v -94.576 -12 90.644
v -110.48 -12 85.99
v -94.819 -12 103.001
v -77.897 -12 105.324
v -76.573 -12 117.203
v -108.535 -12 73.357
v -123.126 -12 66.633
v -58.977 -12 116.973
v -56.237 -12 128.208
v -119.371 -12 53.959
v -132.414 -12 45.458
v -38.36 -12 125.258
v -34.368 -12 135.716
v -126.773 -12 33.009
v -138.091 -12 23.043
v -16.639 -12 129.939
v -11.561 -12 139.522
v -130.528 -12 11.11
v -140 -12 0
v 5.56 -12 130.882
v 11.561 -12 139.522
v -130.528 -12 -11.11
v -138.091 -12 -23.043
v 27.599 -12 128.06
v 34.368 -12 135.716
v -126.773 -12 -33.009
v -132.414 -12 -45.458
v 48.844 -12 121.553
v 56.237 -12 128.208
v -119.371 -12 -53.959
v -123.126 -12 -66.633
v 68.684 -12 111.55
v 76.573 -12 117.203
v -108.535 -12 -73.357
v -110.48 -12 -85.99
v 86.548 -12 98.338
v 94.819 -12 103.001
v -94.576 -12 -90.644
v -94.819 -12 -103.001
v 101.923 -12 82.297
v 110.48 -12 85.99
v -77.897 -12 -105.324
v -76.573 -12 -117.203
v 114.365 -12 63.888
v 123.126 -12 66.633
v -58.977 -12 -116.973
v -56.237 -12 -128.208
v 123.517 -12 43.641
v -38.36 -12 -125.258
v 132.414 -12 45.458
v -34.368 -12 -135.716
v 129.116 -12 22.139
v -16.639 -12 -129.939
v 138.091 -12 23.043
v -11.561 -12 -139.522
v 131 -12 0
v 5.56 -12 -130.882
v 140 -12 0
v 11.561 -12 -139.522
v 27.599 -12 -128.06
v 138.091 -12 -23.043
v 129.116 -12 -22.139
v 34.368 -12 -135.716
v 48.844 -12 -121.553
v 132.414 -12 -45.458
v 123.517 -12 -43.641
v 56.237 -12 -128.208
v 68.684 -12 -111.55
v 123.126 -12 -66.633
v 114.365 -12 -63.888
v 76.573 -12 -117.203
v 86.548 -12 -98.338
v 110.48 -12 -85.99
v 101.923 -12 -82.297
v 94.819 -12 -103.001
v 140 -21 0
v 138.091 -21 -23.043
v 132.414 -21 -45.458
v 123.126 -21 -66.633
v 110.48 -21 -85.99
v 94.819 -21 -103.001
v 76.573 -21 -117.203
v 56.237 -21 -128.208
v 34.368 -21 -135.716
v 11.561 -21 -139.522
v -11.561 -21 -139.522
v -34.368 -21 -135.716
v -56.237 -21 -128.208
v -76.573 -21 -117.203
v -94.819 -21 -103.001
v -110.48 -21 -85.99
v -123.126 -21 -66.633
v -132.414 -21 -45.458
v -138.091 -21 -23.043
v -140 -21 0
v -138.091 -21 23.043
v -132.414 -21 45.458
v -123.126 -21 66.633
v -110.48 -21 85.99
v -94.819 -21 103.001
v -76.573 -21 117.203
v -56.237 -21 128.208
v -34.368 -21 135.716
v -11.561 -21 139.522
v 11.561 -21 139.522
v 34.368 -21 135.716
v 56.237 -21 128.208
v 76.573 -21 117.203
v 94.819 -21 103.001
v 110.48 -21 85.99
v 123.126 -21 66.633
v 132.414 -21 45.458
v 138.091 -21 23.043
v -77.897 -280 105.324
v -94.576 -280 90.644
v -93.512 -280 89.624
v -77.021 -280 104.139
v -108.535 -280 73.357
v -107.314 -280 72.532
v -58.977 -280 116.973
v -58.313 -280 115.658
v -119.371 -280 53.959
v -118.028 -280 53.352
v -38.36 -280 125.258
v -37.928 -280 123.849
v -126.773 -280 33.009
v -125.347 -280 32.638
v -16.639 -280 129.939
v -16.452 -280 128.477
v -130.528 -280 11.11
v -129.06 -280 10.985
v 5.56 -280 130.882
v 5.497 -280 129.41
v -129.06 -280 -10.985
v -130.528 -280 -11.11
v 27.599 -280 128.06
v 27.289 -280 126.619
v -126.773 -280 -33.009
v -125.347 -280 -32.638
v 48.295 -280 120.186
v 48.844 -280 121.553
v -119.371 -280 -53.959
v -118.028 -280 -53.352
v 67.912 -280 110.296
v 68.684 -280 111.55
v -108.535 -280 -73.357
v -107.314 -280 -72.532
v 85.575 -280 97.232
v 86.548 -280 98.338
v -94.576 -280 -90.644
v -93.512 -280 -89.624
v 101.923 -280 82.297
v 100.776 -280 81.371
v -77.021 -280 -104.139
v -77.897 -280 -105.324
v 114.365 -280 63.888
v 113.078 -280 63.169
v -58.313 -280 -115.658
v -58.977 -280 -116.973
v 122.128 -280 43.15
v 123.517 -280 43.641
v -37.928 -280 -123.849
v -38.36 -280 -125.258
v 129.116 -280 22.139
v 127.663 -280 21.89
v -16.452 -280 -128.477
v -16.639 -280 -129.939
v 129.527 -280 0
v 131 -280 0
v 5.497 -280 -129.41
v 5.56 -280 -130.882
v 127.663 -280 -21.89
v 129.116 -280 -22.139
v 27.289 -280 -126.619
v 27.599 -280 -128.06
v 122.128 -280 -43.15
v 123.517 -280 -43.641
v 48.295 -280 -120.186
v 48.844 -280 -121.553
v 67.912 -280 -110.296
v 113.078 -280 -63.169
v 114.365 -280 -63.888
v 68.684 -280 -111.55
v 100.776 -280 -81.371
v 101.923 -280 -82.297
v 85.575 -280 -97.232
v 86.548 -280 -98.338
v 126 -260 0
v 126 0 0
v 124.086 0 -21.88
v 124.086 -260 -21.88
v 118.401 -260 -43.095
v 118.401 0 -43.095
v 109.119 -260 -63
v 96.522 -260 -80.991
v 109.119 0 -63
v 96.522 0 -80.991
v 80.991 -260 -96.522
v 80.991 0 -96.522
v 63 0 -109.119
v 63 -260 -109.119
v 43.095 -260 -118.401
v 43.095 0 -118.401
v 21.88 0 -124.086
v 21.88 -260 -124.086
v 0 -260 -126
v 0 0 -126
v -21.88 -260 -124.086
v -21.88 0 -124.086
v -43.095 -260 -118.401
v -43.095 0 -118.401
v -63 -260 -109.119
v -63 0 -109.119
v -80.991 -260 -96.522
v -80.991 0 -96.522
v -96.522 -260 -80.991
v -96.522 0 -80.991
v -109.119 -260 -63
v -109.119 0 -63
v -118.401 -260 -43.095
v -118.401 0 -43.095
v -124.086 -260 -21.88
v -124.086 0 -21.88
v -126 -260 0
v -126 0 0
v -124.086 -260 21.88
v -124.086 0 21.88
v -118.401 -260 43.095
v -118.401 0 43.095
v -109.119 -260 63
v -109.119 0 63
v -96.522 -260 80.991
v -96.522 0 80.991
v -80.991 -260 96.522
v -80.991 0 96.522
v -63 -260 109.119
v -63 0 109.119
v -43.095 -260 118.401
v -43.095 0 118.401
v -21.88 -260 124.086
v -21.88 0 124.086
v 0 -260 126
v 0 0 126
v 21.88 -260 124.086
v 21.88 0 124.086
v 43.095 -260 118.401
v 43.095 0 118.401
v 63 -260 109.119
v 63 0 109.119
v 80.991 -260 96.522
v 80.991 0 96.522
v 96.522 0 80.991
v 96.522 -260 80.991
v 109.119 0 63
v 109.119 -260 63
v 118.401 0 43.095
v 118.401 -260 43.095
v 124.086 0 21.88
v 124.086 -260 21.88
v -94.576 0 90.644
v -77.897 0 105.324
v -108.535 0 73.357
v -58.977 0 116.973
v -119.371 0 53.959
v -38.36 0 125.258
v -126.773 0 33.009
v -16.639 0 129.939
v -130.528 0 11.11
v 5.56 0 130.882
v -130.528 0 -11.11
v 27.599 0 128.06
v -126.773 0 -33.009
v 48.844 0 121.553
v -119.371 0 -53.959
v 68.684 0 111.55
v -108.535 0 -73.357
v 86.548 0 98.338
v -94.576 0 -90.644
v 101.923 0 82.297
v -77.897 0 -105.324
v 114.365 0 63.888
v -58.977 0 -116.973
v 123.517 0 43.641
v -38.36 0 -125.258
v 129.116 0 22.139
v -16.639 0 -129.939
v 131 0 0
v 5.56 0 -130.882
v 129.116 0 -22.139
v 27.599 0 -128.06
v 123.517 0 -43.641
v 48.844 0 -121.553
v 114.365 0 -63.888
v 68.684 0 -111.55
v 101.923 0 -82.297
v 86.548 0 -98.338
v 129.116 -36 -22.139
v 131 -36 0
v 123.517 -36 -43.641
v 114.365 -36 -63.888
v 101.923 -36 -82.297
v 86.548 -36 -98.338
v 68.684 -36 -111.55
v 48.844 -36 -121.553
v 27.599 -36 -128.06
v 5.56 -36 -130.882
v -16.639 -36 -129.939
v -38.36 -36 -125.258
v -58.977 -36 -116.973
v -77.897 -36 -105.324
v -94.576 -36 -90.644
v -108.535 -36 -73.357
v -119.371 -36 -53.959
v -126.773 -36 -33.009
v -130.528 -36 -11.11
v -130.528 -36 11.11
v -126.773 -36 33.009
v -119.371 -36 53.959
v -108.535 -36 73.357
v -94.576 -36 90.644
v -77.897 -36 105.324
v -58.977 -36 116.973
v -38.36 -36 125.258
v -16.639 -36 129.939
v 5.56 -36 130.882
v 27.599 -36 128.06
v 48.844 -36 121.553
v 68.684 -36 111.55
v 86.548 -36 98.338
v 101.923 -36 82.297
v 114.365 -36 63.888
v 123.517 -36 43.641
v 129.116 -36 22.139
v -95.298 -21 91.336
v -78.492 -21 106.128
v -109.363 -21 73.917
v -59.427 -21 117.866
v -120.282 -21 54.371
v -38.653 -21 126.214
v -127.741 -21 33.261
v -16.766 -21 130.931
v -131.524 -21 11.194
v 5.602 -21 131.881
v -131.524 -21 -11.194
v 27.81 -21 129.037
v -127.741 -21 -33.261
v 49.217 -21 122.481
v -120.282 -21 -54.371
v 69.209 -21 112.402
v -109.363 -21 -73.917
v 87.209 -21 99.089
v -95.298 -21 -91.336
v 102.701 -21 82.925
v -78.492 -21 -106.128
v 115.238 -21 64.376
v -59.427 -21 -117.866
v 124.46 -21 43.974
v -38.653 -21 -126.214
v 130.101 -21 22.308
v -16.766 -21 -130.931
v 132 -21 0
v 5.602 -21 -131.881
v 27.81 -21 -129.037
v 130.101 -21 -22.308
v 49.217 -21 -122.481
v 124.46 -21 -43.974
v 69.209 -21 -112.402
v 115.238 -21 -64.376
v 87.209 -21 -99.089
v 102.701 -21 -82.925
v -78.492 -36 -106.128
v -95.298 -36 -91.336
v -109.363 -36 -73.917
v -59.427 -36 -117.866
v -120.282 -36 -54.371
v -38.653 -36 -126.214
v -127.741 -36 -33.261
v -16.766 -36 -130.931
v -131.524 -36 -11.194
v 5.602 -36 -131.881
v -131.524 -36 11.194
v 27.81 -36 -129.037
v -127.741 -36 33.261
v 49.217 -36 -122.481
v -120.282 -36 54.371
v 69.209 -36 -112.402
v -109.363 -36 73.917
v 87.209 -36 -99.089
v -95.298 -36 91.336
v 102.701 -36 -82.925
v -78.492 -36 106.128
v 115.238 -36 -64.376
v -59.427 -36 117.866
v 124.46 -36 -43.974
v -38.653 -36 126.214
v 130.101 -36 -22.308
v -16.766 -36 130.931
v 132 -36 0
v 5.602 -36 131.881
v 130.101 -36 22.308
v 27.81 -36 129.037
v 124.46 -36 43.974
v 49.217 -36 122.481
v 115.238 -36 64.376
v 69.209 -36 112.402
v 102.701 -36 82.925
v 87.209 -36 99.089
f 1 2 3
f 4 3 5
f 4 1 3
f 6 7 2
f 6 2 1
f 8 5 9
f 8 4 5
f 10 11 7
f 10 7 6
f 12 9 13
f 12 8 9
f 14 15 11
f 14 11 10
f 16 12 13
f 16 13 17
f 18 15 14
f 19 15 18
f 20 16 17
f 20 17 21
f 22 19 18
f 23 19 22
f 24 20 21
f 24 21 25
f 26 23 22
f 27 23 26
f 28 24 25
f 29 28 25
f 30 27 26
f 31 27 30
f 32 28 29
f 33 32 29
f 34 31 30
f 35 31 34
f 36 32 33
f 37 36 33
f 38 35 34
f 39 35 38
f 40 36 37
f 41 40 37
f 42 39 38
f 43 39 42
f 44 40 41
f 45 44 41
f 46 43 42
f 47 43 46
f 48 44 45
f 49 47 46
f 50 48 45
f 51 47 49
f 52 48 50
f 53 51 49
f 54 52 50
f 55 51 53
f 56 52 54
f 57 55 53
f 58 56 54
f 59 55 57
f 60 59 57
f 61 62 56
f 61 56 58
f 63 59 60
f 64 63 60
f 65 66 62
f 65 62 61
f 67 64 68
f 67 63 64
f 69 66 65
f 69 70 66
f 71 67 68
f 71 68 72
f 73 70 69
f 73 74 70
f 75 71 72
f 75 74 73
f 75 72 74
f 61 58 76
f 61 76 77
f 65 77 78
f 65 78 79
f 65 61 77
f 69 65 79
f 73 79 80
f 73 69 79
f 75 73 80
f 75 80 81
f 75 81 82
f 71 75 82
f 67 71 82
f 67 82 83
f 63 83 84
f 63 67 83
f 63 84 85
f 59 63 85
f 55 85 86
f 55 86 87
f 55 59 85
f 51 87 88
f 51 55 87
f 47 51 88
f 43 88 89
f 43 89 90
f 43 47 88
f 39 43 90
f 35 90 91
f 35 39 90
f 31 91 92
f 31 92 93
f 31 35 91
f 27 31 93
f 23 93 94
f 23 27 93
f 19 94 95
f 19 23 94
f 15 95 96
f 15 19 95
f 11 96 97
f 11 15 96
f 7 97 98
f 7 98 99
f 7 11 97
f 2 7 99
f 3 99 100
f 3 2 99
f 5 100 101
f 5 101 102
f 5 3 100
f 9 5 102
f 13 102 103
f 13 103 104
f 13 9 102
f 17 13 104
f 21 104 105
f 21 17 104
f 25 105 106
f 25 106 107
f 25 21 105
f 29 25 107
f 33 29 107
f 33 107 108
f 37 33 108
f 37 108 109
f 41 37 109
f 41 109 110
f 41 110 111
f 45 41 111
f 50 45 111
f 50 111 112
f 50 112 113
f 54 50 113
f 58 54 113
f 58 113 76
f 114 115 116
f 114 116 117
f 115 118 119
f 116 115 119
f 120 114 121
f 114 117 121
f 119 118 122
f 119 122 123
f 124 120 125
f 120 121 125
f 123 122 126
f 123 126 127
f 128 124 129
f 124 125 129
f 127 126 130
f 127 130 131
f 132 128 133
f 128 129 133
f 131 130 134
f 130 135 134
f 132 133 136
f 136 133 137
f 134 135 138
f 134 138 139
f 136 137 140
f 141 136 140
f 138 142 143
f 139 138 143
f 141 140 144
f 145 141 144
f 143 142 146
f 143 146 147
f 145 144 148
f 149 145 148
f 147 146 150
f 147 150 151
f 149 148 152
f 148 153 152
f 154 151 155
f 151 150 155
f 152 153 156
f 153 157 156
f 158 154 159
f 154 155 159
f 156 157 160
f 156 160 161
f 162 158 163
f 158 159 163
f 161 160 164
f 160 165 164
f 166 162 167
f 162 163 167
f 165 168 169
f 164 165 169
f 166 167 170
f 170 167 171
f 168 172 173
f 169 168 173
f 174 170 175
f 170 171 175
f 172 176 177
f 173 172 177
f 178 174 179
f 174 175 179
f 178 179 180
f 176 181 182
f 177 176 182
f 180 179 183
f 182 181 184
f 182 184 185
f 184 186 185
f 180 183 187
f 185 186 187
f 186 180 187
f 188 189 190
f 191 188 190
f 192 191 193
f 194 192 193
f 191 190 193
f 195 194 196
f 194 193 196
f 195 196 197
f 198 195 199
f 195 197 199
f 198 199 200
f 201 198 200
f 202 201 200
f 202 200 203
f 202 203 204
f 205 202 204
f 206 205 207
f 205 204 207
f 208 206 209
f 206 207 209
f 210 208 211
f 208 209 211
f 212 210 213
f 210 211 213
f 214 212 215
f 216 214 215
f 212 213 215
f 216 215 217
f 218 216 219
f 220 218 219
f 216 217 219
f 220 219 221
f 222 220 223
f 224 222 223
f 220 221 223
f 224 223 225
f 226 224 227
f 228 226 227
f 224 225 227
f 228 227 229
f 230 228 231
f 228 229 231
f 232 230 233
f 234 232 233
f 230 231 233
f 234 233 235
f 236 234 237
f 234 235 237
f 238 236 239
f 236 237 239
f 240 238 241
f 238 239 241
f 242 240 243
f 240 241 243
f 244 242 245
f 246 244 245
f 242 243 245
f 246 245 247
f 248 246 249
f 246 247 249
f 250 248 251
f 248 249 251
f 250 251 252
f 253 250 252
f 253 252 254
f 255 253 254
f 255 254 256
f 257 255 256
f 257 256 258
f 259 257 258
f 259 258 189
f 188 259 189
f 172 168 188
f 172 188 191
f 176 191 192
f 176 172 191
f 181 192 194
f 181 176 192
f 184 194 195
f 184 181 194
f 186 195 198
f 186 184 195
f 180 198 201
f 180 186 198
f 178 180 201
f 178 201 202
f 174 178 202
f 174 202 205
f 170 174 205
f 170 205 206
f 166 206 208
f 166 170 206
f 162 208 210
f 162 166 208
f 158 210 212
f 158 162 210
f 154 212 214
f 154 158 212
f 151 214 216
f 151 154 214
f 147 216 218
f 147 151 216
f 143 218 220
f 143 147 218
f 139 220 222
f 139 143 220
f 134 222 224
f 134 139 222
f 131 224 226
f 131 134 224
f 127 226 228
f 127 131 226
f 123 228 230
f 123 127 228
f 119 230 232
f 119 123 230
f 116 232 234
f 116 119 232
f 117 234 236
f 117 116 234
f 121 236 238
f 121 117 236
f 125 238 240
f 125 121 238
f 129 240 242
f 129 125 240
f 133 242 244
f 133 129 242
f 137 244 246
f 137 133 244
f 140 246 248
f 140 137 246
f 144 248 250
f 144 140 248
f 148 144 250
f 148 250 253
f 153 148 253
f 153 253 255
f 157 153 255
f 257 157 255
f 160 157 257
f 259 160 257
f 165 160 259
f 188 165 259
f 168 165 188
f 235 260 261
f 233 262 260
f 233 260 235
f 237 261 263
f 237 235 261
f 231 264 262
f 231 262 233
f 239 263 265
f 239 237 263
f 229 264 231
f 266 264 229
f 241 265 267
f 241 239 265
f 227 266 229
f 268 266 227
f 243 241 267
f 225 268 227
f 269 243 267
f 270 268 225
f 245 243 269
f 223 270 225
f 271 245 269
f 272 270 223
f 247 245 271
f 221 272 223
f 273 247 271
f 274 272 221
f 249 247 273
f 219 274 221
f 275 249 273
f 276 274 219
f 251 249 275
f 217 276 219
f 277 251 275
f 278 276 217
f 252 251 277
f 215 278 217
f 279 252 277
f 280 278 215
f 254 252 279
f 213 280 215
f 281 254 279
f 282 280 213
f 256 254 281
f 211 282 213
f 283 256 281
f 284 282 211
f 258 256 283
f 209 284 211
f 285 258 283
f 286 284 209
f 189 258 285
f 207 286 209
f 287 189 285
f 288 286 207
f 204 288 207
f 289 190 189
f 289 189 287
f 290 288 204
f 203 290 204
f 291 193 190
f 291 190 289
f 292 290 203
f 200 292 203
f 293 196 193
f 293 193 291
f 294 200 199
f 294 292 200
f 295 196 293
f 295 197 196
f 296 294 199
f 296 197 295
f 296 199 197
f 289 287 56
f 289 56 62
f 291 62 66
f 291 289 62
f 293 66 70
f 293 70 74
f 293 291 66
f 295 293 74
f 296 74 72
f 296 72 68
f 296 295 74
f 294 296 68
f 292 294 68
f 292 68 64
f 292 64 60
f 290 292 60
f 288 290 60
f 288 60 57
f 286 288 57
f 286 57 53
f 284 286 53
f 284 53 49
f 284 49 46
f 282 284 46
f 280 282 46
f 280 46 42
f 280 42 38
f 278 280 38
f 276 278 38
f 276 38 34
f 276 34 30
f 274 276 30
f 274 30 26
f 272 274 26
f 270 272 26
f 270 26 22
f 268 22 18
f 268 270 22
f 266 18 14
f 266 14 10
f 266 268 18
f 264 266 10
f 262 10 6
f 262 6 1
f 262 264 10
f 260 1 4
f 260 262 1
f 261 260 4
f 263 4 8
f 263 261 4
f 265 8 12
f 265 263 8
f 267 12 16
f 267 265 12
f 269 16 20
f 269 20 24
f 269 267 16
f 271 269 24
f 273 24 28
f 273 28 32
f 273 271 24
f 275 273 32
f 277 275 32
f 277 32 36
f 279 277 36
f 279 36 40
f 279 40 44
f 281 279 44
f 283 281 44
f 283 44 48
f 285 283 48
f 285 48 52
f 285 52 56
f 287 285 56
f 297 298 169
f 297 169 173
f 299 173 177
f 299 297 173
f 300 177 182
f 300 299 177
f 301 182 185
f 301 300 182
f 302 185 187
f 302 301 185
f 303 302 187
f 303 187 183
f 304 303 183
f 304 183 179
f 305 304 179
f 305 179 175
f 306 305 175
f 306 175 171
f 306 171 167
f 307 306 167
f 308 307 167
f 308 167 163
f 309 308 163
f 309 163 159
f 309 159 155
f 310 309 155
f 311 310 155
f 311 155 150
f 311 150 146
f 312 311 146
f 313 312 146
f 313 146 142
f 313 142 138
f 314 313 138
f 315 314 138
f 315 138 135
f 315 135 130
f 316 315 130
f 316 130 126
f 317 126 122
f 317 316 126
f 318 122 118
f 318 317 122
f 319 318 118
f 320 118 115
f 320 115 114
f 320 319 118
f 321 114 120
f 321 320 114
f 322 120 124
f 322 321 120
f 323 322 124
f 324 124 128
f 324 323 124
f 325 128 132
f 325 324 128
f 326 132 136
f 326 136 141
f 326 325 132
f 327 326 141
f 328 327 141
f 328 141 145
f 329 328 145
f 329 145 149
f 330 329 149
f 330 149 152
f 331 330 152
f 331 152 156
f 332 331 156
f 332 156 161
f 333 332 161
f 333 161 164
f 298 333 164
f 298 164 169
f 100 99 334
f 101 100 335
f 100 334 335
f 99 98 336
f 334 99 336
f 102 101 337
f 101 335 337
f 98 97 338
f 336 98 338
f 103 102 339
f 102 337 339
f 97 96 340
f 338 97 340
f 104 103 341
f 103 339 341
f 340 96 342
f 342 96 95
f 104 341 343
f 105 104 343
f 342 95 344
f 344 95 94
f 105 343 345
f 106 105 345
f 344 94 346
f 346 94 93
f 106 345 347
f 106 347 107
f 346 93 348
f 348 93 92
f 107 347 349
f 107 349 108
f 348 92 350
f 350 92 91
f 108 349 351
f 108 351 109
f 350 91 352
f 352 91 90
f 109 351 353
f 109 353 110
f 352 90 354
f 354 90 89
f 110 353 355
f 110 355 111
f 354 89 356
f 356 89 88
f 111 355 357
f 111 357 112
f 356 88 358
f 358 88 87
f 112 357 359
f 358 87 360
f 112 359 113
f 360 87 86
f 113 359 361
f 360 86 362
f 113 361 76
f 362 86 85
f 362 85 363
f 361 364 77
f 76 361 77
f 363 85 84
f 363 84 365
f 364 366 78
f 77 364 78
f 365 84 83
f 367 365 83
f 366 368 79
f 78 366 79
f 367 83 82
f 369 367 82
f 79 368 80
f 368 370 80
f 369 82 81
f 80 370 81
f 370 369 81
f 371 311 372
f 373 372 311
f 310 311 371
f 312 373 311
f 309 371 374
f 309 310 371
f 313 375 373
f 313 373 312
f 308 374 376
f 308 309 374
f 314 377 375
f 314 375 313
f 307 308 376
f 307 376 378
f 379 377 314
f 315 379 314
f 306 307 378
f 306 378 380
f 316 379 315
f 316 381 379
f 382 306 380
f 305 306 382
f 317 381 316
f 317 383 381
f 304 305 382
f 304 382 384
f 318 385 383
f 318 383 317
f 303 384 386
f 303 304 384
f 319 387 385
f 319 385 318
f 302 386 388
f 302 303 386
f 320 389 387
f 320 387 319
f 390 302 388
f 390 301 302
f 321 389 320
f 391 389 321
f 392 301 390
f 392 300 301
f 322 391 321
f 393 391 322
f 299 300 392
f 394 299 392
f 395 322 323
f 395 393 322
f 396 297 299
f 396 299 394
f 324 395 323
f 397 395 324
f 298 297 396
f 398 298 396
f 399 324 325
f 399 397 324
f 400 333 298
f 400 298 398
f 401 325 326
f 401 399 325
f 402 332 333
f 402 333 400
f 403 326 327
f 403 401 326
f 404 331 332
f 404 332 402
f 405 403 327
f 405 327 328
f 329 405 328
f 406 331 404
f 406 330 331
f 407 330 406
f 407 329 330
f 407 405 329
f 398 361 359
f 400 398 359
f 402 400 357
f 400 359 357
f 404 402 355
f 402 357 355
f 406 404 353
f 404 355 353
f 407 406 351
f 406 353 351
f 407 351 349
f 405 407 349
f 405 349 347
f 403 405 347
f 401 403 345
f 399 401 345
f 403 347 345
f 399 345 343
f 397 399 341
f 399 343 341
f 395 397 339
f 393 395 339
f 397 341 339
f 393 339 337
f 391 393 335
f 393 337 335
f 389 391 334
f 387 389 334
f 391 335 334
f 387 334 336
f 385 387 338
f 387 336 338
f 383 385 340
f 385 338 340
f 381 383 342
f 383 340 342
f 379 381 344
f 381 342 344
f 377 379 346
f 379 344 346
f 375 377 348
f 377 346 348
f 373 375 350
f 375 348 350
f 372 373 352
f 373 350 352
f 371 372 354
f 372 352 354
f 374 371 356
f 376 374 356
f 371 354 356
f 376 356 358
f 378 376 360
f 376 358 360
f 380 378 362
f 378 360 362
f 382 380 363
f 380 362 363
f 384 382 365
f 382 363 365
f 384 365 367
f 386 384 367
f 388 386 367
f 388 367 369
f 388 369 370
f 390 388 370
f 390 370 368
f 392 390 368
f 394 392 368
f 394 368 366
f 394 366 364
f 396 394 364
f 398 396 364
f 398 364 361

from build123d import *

# Parameters (mm, degrees)
SKETCH1_R           = 131
SKETCH1_R_2         = 126
BOSS_EXTRUDE1_DEPTH = 280
SKETCH4_R           = 140
SKETCH4_R_2         = 131
BOSS_EXTRUDE2_DEPTH = 9
CHAMFER1_SIZE       = 20
CHAMFER1_SIZE2      = 3.526539614
SKETCH5_R           = 132
SKETCH5_R_2         = 131
BOSS_EXTRUDE3_DEPTH = 15


with BuildPart() as part:
    # Sketch1 → Boss-Extrude1 (new body)
    with BuildSketch(Plane(origin=(0, 0, 0), x_dir=(1, 0, 0), z_dir=(0, 1, 0))):
        Circle(SKETCH1_R)
        Circle(SKETCH1_R_2, mode=Mode.SUBTRACT)
    extrude(amount=-BOSS_EXTRUDE1_DEPTH)

    # Sketch4 → Boss-Extrude2 (add)
    with BuildSketch(Plane(origin=(0, -12, 0), x_dir=(1, 0, 0), z_dir=(0, 1, 0))):
        Circle(SKETCH4_R)
        Circle(SKETCH4_R_2, mode=Mode.SUBTRACT)
    extrude(amount=-BOSS_EXTRUDE2_DEPTH)

    # Chamfer1
    chamfer1_edges = [part.edges().sort_by_distance(p)[0] for p in [
        (-126, -280, 0),
    ]]
    chamfer1_side = [part.faces().sort_by_distance(p)[0] for p in [
        (-126, -140, 0),
    ]]
    chamfer(chamfer1_edges, length=CHAMFER1_SIZE, length2=CHAMFER1_SIZE2, reference=chamfer1_side[0])

    # Sketch5 → Boss-Extrude3 (add)
    with BuildSketch(Plane.XZ.offset(21)):
        Circle(SKETCH5_R)
        Circle(SKETCH5_R_2, mode=Mode.SUBTRACT)
    extrude(amount=BOSS_EXTRUDE3_DEPTH)


solid = part.part
